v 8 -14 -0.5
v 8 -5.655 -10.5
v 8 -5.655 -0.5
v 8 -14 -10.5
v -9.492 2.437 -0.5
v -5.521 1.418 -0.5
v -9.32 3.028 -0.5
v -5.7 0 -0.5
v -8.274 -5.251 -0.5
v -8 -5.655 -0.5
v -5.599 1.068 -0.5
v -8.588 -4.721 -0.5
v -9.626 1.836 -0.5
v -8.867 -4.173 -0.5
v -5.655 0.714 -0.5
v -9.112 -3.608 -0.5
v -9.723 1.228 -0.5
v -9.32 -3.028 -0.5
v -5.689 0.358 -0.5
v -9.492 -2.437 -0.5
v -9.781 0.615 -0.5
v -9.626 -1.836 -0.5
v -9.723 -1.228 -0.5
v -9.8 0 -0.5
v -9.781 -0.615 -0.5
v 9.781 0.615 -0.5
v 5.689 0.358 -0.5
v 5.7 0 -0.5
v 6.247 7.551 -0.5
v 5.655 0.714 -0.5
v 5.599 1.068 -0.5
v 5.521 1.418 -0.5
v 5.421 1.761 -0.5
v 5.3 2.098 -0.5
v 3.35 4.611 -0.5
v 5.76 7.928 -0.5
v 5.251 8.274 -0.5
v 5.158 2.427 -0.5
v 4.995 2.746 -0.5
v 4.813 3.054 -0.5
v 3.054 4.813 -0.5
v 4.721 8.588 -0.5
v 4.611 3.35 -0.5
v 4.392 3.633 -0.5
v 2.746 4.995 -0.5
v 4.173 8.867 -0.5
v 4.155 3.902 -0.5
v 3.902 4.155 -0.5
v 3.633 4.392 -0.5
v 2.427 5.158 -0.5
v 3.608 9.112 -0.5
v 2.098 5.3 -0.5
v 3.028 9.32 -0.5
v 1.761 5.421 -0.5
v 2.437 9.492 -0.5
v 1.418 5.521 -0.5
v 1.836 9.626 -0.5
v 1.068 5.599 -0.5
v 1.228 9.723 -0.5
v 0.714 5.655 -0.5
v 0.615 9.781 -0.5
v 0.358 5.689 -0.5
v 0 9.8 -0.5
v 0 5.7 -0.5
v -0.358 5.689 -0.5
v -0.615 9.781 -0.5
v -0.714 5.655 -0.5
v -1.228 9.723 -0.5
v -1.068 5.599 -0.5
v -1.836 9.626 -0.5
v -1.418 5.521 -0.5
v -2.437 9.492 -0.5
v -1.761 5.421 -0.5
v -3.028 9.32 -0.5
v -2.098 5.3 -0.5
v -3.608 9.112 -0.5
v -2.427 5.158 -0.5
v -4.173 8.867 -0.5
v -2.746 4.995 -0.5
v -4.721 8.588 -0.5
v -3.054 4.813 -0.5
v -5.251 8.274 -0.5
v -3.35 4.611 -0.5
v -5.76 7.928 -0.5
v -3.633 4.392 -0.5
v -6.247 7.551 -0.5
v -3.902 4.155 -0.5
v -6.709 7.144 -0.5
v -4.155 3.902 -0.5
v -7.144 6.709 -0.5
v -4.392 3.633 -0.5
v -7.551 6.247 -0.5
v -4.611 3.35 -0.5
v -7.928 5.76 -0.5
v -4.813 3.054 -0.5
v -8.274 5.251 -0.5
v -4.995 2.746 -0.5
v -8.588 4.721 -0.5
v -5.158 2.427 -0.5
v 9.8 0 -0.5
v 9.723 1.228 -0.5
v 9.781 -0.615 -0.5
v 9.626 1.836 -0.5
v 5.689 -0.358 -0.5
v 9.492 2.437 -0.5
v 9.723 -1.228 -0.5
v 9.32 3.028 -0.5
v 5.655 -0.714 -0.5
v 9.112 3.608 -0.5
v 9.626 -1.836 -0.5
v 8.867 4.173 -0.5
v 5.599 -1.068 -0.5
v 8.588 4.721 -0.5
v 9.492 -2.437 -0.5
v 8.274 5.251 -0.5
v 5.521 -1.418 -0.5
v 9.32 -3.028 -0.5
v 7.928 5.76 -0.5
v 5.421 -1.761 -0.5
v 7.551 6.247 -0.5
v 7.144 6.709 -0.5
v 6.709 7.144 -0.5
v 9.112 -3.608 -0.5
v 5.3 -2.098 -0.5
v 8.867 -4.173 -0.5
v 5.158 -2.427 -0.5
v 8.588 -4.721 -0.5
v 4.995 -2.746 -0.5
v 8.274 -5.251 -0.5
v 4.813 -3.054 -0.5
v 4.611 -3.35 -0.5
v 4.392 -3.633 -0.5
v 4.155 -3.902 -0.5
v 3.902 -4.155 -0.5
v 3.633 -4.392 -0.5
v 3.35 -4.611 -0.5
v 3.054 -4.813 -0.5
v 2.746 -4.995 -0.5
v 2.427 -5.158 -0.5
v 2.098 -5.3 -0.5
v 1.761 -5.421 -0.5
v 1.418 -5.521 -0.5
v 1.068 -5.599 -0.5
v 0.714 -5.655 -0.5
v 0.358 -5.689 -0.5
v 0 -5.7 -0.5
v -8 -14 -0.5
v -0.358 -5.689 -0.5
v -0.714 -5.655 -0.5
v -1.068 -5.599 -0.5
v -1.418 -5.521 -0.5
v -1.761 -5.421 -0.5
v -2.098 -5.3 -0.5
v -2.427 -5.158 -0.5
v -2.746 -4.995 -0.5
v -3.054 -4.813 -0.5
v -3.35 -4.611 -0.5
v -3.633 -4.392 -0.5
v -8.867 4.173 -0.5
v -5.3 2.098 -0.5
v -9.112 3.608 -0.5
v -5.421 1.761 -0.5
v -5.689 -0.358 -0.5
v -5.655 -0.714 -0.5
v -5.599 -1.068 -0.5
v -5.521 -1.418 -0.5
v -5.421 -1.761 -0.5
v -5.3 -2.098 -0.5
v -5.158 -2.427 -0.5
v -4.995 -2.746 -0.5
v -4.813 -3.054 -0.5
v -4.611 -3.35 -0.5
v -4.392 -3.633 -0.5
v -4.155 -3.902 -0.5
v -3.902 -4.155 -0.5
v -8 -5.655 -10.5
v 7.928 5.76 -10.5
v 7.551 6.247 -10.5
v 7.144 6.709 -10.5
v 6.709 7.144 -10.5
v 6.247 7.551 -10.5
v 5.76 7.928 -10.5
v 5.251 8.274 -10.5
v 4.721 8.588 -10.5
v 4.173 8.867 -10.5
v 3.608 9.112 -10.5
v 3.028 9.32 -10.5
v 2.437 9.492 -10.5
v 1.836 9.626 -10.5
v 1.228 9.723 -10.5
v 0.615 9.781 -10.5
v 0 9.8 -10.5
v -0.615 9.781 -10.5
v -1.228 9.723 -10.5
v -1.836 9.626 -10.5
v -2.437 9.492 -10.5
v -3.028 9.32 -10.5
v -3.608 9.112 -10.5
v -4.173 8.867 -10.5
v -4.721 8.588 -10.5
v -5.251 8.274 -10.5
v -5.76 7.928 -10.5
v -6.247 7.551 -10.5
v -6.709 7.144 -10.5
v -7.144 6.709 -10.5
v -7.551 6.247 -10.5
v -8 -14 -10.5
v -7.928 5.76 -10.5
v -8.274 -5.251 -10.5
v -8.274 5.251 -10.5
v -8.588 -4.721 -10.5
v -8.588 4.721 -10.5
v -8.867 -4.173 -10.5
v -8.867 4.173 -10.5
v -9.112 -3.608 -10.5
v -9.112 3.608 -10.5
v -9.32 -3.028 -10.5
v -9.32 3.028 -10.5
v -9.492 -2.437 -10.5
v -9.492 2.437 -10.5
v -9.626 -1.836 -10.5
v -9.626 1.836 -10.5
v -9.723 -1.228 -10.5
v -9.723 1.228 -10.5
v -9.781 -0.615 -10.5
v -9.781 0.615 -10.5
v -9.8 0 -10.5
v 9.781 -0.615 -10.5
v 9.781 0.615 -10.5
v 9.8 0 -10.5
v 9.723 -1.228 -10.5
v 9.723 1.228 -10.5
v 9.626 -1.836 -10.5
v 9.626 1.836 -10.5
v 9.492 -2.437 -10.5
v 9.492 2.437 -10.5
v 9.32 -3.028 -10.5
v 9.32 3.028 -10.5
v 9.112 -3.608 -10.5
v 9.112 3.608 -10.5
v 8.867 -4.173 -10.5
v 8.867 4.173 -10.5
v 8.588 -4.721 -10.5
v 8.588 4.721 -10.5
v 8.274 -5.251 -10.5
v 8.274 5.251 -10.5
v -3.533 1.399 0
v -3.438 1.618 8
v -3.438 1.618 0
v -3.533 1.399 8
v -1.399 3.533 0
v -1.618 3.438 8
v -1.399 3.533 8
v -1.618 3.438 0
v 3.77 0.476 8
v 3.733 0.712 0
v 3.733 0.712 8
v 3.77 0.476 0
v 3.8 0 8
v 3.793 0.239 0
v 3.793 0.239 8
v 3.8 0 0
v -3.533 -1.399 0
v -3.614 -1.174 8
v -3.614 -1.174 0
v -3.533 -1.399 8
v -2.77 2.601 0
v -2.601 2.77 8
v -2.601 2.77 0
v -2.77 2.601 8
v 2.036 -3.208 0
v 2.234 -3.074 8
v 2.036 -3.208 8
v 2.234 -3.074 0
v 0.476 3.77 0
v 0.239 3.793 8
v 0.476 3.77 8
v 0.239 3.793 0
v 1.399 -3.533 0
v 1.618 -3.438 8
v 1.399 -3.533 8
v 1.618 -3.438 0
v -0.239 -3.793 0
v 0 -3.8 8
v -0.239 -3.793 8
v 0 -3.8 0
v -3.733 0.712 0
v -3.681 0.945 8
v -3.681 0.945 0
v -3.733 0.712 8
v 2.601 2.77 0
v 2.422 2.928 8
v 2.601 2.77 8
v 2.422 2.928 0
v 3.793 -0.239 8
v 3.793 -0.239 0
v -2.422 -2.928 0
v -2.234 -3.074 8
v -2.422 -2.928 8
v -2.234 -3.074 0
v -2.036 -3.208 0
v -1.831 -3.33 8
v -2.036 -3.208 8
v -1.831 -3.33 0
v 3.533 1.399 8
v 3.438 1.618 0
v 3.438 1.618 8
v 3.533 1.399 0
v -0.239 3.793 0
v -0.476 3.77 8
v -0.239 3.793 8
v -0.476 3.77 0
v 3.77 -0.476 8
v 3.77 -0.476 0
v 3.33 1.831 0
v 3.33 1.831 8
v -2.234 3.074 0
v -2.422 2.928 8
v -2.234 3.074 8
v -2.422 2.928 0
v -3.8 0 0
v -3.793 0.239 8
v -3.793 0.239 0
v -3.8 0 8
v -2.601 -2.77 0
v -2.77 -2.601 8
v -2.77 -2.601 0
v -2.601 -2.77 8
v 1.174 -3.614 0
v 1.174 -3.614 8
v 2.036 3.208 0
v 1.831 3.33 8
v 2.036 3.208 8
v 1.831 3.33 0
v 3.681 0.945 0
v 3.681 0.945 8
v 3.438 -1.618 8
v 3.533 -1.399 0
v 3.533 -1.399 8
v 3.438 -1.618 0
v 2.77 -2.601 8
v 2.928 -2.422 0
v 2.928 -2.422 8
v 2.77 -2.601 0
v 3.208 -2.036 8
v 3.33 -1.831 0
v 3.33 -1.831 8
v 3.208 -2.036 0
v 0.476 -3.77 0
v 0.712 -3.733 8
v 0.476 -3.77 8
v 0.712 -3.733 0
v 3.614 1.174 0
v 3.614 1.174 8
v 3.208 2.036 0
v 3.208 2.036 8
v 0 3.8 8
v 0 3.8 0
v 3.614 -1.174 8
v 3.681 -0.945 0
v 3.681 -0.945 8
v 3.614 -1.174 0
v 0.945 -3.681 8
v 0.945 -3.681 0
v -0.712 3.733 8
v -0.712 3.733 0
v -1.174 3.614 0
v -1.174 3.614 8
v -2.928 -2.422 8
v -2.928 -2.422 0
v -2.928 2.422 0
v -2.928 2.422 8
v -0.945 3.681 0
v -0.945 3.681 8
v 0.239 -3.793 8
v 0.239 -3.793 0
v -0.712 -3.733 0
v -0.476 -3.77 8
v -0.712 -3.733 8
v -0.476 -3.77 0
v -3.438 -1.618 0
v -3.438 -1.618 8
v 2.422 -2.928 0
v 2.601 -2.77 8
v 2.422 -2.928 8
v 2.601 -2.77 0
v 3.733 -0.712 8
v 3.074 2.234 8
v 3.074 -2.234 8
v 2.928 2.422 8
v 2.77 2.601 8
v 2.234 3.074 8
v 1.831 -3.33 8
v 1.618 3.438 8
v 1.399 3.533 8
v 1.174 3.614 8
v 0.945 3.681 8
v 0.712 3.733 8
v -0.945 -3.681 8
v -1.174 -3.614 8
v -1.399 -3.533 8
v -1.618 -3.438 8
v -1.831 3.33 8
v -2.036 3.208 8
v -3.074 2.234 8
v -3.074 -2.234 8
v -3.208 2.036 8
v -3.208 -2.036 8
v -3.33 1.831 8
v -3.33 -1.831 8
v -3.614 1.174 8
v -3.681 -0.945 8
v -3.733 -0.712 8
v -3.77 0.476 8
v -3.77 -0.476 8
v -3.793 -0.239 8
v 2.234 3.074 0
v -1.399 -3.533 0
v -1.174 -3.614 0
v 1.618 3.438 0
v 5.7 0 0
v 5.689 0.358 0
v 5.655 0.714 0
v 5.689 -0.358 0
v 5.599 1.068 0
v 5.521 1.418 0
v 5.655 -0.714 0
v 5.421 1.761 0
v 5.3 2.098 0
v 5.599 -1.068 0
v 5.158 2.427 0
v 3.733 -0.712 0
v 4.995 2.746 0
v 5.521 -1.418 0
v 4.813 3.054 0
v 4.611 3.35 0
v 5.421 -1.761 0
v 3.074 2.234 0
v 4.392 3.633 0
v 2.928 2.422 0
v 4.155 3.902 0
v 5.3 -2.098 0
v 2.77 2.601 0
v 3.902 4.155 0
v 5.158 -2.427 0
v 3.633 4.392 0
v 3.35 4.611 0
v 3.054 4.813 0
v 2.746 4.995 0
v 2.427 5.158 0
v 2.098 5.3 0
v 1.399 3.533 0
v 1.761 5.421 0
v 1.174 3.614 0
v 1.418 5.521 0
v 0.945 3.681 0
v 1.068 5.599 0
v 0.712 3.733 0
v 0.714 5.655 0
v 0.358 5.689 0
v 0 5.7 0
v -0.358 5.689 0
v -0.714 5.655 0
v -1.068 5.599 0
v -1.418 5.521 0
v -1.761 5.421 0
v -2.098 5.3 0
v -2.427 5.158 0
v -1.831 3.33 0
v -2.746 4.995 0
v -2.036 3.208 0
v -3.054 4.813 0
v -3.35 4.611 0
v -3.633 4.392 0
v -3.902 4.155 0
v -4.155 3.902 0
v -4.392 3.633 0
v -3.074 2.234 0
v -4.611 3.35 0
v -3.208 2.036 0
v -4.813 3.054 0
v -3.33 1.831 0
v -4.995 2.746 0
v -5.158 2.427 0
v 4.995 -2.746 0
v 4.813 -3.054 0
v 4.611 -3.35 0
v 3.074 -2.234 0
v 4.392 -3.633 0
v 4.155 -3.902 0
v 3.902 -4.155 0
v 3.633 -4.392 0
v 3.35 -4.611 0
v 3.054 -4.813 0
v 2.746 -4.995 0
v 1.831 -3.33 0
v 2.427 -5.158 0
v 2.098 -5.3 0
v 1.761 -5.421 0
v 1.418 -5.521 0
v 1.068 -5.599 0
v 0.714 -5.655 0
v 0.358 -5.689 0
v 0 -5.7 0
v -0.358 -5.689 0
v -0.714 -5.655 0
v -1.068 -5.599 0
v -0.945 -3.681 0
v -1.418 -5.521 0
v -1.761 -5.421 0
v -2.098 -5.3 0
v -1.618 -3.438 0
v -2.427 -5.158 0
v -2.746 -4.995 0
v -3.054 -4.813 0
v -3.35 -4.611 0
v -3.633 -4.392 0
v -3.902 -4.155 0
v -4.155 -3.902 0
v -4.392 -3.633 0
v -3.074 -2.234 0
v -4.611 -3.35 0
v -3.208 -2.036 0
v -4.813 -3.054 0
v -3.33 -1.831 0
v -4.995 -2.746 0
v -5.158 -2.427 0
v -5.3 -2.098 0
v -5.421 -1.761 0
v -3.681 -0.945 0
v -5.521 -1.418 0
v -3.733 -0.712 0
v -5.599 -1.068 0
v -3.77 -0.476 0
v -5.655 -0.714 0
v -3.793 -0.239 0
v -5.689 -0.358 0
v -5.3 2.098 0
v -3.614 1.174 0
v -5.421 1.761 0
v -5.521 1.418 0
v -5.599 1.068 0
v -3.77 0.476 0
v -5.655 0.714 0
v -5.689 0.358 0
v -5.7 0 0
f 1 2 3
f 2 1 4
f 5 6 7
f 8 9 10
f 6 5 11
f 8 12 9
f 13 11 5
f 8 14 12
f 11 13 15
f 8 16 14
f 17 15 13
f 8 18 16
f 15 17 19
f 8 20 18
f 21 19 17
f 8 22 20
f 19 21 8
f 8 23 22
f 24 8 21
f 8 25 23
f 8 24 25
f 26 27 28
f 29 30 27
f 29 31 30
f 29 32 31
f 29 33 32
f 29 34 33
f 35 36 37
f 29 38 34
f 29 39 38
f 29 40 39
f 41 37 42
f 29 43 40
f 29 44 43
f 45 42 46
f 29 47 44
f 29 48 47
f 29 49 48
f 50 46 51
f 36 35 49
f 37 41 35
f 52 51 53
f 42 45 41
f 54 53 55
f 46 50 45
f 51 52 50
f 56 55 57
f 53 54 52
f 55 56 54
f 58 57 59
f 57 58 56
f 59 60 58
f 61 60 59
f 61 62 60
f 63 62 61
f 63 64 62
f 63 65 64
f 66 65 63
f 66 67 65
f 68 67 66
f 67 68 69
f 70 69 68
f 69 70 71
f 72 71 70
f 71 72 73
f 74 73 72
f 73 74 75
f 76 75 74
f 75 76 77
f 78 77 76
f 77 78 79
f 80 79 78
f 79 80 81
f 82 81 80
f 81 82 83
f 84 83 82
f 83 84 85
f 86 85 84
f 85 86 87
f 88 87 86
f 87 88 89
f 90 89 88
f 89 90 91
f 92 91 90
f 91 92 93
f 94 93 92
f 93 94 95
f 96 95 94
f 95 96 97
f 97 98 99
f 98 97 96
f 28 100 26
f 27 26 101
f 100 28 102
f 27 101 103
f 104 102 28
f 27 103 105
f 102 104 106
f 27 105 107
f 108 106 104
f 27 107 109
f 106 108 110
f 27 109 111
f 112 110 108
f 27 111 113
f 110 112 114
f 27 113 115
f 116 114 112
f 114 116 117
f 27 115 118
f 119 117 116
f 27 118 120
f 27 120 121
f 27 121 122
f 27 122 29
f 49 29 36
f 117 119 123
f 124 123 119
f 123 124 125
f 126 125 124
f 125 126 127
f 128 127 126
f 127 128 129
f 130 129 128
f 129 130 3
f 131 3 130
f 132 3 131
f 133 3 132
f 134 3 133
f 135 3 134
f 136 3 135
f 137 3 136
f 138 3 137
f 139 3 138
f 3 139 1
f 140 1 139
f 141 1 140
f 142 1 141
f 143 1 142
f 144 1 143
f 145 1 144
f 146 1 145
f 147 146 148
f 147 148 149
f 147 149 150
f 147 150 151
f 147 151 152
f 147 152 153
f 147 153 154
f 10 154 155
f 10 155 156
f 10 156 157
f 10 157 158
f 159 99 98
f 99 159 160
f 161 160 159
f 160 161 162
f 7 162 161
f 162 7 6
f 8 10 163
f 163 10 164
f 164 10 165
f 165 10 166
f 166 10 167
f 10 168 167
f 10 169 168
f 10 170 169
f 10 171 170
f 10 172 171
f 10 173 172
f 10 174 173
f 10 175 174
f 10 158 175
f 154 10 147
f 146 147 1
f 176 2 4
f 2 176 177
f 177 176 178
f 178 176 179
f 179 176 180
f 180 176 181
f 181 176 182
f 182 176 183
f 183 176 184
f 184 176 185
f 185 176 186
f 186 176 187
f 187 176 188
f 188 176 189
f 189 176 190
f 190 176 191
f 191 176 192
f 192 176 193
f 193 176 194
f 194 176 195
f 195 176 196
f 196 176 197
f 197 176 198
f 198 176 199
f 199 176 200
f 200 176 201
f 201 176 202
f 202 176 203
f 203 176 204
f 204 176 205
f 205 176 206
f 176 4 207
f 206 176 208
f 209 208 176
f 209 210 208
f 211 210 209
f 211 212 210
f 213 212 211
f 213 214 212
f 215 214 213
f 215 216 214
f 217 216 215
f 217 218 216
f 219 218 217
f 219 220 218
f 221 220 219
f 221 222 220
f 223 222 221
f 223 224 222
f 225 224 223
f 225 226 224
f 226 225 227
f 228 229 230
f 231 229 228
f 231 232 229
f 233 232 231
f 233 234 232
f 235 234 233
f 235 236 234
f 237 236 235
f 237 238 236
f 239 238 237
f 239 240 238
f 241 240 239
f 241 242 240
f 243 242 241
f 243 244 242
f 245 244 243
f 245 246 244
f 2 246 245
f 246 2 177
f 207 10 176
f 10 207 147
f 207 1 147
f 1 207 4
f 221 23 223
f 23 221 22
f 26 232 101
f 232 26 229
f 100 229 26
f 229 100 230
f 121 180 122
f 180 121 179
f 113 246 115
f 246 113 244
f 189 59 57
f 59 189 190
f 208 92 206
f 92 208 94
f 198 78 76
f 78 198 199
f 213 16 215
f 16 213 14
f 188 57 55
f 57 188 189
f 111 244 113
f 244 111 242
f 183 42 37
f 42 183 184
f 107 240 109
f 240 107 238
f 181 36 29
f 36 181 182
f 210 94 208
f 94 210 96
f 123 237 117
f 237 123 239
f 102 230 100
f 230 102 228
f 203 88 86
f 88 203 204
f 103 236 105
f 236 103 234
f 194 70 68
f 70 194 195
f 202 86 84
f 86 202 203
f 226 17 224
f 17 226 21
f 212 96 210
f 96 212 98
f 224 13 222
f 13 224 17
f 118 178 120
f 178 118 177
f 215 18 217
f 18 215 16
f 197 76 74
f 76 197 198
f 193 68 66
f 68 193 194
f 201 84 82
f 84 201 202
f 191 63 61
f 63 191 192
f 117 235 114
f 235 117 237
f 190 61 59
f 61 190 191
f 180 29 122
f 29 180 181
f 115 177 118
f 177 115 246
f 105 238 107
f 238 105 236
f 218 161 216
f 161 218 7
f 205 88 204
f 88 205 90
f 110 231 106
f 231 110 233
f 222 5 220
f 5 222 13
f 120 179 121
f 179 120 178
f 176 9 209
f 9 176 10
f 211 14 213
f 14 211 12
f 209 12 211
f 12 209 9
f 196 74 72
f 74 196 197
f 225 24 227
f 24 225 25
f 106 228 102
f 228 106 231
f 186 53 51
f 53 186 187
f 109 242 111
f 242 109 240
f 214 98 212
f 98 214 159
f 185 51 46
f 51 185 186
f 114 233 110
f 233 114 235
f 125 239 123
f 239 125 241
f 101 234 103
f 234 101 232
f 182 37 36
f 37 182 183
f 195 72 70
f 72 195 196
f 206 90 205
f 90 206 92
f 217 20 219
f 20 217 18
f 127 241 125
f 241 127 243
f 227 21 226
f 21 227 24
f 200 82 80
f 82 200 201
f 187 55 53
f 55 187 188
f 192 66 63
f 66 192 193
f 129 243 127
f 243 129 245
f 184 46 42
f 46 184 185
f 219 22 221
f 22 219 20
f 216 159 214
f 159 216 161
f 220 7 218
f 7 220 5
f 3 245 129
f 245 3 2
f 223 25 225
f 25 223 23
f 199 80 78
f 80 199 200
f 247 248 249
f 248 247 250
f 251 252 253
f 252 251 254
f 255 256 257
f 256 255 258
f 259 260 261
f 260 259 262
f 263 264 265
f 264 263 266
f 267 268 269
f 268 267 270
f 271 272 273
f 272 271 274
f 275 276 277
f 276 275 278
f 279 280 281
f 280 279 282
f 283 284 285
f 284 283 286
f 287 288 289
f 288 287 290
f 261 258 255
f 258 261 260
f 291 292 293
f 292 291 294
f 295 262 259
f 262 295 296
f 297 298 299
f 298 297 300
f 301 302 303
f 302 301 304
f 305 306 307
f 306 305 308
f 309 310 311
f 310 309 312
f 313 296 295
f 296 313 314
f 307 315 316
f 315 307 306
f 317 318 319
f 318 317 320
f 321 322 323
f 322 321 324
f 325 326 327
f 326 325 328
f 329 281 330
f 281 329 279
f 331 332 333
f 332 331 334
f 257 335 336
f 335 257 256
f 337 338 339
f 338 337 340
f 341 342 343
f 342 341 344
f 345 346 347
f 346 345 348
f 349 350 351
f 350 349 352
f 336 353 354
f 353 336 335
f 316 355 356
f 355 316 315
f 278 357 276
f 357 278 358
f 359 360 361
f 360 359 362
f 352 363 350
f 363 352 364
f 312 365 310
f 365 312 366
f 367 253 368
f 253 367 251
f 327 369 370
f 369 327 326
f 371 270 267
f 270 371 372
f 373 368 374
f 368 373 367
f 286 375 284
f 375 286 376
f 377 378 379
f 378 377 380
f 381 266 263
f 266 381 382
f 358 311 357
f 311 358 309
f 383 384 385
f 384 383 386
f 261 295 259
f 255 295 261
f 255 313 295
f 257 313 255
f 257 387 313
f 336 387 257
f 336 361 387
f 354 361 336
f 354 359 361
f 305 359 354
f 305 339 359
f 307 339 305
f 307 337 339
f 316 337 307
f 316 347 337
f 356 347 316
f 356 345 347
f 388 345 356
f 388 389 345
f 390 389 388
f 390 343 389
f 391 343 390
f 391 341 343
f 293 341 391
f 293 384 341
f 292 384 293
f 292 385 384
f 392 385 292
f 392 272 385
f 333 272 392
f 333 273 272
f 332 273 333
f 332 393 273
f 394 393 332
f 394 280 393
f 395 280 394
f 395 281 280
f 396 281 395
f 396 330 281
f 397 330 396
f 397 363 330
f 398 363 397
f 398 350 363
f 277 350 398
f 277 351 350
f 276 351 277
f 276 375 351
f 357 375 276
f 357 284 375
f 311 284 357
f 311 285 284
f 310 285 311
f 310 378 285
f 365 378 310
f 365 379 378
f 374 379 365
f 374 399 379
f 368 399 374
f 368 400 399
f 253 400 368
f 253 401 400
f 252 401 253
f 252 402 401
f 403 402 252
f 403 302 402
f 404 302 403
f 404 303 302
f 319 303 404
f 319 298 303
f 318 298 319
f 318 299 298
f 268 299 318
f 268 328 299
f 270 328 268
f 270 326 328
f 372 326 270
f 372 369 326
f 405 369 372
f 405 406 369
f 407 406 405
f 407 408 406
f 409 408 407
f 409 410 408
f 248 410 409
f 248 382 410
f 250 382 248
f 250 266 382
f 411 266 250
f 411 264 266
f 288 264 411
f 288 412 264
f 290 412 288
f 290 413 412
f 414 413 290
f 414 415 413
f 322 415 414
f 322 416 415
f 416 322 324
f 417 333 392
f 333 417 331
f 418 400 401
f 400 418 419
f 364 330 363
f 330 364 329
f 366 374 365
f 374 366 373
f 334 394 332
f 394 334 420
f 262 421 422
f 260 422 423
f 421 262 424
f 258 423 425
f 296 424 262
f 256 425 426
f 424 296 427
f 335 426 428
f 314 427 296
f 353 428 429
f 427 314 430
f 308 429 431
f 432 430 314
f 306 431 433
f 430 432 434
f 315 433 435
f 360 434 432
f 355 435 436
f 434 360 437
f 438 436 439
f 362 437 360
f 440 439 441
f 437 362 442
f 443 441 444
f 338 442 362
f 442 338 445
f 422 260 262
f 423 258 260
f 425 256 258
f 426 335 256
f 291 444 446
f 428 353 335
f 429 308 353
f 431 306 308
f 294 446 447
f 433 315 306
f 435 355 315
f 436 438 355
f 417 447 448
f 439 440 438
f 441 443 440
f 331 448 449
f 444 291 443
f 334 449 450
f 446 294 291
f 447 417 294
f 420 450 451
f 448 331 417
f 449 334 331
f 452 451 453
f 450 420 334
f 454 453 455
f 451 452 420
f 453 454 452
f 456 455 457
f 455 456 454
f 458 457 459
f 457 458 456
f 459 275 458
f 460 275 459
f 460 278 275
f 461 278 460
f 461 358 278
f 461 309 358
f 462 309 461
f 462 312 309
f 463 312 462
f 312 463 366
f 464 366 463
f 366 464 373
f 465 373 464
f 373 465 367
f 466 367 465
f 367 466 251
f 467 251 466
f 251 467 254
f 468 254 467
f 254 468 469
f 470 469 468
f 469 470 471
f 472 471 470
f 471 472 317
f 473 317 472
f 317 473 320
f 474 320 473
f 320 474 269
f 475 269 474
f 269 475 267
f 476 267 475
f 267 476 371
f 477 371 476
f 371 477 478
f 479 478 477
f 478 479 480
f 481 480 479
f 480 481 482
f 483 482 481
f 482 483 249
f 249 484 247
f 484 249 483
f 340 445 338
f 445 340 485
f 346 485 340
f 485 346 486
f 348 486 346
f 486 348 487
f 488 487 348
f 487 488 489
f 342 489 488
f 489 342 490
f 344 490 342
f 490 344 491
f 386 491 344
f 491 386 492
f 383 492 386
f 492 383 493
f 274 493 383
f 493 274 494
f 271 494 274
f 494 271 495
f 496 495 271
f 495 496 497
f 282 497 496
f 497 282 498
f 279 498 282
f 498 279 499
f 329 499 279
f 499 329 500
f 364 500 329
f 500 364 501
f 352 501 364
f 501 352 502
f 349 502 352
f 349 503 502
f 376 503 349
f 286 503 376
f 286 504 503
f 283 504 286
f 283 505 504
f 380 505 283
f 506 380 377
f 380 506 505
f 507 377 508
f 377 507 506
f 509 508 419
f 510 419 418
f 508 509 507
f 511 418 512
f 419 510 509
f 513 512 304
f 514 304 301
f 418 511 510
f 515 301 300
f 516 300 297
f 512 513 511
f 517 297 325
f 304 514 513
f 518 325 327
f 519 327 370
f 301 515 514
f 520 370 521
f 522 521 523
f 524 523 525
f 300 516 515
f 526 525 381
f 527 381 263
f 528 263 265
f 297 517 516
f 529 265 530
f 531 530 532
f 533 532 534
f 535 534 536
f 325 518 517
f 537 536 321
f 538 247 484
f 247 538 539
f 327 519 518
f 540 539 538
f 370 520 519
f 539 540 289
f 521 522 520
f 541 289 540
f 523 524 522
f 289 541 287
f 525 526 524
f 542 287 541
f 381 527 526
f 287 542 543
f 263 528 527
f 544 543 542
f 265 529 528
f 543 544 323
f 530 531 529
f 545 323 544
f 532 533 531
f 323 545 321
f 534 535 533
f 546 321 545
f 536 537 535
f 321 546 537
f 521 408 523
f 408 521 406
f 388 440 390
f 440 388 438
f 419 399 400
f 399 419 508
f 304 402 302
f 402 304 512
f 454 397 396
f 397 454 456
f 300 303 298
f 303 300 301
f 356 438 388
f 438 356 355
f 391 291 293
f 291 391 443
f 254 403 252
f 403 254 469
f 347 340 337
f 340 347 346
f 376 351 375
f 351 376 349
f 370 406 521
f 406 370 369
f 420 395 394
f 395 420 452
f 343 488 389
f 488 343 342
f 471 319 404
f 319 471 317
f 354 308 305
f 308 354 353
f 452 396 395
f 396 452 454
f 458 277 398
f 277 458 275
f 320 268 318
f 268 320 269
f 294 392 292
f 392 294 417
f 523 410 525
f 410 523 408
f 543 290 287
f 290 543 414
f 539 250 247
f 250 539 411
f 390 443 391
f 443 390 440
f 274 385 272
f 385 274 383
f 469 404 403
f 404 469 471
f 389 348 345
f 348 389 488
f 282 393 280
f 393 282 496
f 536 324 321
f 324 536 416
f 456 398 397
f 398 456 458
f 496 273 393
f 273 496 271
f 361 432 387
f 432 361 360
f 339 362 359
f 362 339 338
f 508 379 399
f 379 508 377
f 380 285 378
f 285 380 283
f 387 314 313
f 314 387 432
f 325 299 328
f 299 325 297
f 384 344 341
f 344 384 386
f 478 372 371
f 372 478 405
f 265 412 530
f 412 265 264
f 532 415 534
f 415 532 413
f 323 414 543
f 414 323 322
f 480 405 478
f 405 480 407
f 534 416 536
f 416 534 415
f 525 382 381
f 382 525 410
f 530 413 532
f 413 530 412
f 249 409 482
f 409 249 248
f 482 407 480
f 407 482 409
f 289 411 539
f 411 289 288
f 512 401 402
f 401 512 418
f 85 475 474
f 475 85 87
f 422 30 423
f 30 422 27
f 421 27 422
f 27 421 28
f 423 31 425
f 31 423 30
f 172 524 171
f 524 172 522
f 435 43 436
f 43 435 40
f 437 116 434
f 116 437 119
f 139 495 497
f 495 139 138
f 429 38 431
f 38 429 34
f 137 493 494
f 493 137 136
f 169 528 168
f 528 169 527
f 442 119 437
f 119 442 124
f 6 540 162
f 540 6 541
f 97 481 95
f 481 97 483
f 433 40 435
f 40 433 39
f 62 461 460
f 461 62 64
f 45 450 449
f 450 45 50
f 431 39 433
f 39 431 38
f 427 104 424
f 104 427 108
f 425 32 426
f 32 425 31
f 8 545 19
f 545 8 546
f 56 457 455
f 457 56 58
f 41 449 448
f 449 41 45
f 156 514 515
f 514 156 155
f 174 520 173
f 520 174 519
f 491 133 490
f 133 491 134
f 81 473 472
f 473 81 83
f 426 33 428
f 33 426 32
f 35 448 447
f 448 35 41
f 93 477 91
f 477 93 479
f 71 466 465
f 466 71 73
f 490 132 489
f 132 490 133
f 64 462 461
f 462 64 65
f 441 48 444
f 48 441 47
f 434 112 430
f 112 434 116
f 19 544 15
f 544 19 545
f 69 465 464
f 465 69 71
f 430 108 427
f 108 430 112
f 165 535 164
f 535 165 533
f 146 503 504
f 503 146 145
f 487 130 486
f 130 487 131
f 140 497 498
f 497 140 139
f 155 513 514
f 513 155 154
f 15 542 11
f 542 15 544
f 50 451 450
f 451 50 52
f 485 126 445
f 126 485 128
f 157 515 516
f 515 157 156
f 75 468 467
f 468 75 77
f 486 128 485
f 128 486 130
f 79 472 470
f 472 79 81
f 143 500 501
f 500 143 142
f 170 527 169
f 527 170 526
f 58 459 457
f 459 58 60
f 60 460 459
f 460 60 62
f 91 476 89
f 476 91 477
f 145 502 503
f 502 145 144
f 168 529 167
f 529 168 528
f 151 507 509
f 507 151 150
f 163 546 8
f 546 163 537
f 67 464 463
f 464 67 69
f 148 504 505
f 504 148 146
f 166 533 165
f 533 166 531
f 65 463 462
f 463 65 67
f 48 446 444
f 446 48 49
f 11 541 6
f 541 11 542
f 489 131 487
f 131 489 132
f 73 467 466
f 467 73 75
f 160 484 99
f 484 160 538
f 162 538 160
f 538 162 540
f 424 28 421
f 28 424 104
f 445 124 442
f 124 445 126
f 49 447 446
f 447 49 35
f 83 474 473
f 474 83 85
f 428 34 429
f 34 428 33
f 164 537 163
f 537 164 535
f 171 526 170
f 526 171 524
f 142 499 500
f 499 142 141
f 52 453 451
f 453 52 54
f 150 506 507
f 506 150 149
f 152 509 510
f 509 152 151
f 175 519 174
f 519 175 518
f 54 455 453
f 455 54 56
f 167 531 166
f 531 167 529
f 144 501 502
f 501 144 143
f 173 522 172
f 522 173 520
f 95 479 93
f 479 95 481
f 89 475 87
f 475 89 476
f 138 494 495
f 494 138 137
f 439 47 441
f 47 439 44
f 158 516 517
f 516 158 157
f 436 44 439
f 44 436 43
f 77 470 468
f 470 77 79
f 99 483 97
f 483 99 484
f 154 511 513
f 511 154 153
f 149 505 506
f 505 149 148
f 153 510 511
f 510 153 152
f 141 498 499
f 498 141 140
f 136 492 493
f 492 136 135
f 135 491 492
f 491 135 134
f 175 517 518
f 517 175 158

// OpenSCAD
tolerance = 0.3;
$fn = $preview ? 20 : 100;

module pot_alpha_16mm() {
    cylinder(r = 3.5 + tolerance, h = 8);
    
    translate([0, 0, -0.5])
    cylinder(r = 5.4 + tolerance, h = 0.5);
       
    translate([0, 0, -10.5])
    union() {
        translate([-8, -14, 0])
        cube([16, 14, 10]);
        
        cylinder(r = 9.5 + tolerance, h = 10);
    }
}

pot_alpha_16mm();
